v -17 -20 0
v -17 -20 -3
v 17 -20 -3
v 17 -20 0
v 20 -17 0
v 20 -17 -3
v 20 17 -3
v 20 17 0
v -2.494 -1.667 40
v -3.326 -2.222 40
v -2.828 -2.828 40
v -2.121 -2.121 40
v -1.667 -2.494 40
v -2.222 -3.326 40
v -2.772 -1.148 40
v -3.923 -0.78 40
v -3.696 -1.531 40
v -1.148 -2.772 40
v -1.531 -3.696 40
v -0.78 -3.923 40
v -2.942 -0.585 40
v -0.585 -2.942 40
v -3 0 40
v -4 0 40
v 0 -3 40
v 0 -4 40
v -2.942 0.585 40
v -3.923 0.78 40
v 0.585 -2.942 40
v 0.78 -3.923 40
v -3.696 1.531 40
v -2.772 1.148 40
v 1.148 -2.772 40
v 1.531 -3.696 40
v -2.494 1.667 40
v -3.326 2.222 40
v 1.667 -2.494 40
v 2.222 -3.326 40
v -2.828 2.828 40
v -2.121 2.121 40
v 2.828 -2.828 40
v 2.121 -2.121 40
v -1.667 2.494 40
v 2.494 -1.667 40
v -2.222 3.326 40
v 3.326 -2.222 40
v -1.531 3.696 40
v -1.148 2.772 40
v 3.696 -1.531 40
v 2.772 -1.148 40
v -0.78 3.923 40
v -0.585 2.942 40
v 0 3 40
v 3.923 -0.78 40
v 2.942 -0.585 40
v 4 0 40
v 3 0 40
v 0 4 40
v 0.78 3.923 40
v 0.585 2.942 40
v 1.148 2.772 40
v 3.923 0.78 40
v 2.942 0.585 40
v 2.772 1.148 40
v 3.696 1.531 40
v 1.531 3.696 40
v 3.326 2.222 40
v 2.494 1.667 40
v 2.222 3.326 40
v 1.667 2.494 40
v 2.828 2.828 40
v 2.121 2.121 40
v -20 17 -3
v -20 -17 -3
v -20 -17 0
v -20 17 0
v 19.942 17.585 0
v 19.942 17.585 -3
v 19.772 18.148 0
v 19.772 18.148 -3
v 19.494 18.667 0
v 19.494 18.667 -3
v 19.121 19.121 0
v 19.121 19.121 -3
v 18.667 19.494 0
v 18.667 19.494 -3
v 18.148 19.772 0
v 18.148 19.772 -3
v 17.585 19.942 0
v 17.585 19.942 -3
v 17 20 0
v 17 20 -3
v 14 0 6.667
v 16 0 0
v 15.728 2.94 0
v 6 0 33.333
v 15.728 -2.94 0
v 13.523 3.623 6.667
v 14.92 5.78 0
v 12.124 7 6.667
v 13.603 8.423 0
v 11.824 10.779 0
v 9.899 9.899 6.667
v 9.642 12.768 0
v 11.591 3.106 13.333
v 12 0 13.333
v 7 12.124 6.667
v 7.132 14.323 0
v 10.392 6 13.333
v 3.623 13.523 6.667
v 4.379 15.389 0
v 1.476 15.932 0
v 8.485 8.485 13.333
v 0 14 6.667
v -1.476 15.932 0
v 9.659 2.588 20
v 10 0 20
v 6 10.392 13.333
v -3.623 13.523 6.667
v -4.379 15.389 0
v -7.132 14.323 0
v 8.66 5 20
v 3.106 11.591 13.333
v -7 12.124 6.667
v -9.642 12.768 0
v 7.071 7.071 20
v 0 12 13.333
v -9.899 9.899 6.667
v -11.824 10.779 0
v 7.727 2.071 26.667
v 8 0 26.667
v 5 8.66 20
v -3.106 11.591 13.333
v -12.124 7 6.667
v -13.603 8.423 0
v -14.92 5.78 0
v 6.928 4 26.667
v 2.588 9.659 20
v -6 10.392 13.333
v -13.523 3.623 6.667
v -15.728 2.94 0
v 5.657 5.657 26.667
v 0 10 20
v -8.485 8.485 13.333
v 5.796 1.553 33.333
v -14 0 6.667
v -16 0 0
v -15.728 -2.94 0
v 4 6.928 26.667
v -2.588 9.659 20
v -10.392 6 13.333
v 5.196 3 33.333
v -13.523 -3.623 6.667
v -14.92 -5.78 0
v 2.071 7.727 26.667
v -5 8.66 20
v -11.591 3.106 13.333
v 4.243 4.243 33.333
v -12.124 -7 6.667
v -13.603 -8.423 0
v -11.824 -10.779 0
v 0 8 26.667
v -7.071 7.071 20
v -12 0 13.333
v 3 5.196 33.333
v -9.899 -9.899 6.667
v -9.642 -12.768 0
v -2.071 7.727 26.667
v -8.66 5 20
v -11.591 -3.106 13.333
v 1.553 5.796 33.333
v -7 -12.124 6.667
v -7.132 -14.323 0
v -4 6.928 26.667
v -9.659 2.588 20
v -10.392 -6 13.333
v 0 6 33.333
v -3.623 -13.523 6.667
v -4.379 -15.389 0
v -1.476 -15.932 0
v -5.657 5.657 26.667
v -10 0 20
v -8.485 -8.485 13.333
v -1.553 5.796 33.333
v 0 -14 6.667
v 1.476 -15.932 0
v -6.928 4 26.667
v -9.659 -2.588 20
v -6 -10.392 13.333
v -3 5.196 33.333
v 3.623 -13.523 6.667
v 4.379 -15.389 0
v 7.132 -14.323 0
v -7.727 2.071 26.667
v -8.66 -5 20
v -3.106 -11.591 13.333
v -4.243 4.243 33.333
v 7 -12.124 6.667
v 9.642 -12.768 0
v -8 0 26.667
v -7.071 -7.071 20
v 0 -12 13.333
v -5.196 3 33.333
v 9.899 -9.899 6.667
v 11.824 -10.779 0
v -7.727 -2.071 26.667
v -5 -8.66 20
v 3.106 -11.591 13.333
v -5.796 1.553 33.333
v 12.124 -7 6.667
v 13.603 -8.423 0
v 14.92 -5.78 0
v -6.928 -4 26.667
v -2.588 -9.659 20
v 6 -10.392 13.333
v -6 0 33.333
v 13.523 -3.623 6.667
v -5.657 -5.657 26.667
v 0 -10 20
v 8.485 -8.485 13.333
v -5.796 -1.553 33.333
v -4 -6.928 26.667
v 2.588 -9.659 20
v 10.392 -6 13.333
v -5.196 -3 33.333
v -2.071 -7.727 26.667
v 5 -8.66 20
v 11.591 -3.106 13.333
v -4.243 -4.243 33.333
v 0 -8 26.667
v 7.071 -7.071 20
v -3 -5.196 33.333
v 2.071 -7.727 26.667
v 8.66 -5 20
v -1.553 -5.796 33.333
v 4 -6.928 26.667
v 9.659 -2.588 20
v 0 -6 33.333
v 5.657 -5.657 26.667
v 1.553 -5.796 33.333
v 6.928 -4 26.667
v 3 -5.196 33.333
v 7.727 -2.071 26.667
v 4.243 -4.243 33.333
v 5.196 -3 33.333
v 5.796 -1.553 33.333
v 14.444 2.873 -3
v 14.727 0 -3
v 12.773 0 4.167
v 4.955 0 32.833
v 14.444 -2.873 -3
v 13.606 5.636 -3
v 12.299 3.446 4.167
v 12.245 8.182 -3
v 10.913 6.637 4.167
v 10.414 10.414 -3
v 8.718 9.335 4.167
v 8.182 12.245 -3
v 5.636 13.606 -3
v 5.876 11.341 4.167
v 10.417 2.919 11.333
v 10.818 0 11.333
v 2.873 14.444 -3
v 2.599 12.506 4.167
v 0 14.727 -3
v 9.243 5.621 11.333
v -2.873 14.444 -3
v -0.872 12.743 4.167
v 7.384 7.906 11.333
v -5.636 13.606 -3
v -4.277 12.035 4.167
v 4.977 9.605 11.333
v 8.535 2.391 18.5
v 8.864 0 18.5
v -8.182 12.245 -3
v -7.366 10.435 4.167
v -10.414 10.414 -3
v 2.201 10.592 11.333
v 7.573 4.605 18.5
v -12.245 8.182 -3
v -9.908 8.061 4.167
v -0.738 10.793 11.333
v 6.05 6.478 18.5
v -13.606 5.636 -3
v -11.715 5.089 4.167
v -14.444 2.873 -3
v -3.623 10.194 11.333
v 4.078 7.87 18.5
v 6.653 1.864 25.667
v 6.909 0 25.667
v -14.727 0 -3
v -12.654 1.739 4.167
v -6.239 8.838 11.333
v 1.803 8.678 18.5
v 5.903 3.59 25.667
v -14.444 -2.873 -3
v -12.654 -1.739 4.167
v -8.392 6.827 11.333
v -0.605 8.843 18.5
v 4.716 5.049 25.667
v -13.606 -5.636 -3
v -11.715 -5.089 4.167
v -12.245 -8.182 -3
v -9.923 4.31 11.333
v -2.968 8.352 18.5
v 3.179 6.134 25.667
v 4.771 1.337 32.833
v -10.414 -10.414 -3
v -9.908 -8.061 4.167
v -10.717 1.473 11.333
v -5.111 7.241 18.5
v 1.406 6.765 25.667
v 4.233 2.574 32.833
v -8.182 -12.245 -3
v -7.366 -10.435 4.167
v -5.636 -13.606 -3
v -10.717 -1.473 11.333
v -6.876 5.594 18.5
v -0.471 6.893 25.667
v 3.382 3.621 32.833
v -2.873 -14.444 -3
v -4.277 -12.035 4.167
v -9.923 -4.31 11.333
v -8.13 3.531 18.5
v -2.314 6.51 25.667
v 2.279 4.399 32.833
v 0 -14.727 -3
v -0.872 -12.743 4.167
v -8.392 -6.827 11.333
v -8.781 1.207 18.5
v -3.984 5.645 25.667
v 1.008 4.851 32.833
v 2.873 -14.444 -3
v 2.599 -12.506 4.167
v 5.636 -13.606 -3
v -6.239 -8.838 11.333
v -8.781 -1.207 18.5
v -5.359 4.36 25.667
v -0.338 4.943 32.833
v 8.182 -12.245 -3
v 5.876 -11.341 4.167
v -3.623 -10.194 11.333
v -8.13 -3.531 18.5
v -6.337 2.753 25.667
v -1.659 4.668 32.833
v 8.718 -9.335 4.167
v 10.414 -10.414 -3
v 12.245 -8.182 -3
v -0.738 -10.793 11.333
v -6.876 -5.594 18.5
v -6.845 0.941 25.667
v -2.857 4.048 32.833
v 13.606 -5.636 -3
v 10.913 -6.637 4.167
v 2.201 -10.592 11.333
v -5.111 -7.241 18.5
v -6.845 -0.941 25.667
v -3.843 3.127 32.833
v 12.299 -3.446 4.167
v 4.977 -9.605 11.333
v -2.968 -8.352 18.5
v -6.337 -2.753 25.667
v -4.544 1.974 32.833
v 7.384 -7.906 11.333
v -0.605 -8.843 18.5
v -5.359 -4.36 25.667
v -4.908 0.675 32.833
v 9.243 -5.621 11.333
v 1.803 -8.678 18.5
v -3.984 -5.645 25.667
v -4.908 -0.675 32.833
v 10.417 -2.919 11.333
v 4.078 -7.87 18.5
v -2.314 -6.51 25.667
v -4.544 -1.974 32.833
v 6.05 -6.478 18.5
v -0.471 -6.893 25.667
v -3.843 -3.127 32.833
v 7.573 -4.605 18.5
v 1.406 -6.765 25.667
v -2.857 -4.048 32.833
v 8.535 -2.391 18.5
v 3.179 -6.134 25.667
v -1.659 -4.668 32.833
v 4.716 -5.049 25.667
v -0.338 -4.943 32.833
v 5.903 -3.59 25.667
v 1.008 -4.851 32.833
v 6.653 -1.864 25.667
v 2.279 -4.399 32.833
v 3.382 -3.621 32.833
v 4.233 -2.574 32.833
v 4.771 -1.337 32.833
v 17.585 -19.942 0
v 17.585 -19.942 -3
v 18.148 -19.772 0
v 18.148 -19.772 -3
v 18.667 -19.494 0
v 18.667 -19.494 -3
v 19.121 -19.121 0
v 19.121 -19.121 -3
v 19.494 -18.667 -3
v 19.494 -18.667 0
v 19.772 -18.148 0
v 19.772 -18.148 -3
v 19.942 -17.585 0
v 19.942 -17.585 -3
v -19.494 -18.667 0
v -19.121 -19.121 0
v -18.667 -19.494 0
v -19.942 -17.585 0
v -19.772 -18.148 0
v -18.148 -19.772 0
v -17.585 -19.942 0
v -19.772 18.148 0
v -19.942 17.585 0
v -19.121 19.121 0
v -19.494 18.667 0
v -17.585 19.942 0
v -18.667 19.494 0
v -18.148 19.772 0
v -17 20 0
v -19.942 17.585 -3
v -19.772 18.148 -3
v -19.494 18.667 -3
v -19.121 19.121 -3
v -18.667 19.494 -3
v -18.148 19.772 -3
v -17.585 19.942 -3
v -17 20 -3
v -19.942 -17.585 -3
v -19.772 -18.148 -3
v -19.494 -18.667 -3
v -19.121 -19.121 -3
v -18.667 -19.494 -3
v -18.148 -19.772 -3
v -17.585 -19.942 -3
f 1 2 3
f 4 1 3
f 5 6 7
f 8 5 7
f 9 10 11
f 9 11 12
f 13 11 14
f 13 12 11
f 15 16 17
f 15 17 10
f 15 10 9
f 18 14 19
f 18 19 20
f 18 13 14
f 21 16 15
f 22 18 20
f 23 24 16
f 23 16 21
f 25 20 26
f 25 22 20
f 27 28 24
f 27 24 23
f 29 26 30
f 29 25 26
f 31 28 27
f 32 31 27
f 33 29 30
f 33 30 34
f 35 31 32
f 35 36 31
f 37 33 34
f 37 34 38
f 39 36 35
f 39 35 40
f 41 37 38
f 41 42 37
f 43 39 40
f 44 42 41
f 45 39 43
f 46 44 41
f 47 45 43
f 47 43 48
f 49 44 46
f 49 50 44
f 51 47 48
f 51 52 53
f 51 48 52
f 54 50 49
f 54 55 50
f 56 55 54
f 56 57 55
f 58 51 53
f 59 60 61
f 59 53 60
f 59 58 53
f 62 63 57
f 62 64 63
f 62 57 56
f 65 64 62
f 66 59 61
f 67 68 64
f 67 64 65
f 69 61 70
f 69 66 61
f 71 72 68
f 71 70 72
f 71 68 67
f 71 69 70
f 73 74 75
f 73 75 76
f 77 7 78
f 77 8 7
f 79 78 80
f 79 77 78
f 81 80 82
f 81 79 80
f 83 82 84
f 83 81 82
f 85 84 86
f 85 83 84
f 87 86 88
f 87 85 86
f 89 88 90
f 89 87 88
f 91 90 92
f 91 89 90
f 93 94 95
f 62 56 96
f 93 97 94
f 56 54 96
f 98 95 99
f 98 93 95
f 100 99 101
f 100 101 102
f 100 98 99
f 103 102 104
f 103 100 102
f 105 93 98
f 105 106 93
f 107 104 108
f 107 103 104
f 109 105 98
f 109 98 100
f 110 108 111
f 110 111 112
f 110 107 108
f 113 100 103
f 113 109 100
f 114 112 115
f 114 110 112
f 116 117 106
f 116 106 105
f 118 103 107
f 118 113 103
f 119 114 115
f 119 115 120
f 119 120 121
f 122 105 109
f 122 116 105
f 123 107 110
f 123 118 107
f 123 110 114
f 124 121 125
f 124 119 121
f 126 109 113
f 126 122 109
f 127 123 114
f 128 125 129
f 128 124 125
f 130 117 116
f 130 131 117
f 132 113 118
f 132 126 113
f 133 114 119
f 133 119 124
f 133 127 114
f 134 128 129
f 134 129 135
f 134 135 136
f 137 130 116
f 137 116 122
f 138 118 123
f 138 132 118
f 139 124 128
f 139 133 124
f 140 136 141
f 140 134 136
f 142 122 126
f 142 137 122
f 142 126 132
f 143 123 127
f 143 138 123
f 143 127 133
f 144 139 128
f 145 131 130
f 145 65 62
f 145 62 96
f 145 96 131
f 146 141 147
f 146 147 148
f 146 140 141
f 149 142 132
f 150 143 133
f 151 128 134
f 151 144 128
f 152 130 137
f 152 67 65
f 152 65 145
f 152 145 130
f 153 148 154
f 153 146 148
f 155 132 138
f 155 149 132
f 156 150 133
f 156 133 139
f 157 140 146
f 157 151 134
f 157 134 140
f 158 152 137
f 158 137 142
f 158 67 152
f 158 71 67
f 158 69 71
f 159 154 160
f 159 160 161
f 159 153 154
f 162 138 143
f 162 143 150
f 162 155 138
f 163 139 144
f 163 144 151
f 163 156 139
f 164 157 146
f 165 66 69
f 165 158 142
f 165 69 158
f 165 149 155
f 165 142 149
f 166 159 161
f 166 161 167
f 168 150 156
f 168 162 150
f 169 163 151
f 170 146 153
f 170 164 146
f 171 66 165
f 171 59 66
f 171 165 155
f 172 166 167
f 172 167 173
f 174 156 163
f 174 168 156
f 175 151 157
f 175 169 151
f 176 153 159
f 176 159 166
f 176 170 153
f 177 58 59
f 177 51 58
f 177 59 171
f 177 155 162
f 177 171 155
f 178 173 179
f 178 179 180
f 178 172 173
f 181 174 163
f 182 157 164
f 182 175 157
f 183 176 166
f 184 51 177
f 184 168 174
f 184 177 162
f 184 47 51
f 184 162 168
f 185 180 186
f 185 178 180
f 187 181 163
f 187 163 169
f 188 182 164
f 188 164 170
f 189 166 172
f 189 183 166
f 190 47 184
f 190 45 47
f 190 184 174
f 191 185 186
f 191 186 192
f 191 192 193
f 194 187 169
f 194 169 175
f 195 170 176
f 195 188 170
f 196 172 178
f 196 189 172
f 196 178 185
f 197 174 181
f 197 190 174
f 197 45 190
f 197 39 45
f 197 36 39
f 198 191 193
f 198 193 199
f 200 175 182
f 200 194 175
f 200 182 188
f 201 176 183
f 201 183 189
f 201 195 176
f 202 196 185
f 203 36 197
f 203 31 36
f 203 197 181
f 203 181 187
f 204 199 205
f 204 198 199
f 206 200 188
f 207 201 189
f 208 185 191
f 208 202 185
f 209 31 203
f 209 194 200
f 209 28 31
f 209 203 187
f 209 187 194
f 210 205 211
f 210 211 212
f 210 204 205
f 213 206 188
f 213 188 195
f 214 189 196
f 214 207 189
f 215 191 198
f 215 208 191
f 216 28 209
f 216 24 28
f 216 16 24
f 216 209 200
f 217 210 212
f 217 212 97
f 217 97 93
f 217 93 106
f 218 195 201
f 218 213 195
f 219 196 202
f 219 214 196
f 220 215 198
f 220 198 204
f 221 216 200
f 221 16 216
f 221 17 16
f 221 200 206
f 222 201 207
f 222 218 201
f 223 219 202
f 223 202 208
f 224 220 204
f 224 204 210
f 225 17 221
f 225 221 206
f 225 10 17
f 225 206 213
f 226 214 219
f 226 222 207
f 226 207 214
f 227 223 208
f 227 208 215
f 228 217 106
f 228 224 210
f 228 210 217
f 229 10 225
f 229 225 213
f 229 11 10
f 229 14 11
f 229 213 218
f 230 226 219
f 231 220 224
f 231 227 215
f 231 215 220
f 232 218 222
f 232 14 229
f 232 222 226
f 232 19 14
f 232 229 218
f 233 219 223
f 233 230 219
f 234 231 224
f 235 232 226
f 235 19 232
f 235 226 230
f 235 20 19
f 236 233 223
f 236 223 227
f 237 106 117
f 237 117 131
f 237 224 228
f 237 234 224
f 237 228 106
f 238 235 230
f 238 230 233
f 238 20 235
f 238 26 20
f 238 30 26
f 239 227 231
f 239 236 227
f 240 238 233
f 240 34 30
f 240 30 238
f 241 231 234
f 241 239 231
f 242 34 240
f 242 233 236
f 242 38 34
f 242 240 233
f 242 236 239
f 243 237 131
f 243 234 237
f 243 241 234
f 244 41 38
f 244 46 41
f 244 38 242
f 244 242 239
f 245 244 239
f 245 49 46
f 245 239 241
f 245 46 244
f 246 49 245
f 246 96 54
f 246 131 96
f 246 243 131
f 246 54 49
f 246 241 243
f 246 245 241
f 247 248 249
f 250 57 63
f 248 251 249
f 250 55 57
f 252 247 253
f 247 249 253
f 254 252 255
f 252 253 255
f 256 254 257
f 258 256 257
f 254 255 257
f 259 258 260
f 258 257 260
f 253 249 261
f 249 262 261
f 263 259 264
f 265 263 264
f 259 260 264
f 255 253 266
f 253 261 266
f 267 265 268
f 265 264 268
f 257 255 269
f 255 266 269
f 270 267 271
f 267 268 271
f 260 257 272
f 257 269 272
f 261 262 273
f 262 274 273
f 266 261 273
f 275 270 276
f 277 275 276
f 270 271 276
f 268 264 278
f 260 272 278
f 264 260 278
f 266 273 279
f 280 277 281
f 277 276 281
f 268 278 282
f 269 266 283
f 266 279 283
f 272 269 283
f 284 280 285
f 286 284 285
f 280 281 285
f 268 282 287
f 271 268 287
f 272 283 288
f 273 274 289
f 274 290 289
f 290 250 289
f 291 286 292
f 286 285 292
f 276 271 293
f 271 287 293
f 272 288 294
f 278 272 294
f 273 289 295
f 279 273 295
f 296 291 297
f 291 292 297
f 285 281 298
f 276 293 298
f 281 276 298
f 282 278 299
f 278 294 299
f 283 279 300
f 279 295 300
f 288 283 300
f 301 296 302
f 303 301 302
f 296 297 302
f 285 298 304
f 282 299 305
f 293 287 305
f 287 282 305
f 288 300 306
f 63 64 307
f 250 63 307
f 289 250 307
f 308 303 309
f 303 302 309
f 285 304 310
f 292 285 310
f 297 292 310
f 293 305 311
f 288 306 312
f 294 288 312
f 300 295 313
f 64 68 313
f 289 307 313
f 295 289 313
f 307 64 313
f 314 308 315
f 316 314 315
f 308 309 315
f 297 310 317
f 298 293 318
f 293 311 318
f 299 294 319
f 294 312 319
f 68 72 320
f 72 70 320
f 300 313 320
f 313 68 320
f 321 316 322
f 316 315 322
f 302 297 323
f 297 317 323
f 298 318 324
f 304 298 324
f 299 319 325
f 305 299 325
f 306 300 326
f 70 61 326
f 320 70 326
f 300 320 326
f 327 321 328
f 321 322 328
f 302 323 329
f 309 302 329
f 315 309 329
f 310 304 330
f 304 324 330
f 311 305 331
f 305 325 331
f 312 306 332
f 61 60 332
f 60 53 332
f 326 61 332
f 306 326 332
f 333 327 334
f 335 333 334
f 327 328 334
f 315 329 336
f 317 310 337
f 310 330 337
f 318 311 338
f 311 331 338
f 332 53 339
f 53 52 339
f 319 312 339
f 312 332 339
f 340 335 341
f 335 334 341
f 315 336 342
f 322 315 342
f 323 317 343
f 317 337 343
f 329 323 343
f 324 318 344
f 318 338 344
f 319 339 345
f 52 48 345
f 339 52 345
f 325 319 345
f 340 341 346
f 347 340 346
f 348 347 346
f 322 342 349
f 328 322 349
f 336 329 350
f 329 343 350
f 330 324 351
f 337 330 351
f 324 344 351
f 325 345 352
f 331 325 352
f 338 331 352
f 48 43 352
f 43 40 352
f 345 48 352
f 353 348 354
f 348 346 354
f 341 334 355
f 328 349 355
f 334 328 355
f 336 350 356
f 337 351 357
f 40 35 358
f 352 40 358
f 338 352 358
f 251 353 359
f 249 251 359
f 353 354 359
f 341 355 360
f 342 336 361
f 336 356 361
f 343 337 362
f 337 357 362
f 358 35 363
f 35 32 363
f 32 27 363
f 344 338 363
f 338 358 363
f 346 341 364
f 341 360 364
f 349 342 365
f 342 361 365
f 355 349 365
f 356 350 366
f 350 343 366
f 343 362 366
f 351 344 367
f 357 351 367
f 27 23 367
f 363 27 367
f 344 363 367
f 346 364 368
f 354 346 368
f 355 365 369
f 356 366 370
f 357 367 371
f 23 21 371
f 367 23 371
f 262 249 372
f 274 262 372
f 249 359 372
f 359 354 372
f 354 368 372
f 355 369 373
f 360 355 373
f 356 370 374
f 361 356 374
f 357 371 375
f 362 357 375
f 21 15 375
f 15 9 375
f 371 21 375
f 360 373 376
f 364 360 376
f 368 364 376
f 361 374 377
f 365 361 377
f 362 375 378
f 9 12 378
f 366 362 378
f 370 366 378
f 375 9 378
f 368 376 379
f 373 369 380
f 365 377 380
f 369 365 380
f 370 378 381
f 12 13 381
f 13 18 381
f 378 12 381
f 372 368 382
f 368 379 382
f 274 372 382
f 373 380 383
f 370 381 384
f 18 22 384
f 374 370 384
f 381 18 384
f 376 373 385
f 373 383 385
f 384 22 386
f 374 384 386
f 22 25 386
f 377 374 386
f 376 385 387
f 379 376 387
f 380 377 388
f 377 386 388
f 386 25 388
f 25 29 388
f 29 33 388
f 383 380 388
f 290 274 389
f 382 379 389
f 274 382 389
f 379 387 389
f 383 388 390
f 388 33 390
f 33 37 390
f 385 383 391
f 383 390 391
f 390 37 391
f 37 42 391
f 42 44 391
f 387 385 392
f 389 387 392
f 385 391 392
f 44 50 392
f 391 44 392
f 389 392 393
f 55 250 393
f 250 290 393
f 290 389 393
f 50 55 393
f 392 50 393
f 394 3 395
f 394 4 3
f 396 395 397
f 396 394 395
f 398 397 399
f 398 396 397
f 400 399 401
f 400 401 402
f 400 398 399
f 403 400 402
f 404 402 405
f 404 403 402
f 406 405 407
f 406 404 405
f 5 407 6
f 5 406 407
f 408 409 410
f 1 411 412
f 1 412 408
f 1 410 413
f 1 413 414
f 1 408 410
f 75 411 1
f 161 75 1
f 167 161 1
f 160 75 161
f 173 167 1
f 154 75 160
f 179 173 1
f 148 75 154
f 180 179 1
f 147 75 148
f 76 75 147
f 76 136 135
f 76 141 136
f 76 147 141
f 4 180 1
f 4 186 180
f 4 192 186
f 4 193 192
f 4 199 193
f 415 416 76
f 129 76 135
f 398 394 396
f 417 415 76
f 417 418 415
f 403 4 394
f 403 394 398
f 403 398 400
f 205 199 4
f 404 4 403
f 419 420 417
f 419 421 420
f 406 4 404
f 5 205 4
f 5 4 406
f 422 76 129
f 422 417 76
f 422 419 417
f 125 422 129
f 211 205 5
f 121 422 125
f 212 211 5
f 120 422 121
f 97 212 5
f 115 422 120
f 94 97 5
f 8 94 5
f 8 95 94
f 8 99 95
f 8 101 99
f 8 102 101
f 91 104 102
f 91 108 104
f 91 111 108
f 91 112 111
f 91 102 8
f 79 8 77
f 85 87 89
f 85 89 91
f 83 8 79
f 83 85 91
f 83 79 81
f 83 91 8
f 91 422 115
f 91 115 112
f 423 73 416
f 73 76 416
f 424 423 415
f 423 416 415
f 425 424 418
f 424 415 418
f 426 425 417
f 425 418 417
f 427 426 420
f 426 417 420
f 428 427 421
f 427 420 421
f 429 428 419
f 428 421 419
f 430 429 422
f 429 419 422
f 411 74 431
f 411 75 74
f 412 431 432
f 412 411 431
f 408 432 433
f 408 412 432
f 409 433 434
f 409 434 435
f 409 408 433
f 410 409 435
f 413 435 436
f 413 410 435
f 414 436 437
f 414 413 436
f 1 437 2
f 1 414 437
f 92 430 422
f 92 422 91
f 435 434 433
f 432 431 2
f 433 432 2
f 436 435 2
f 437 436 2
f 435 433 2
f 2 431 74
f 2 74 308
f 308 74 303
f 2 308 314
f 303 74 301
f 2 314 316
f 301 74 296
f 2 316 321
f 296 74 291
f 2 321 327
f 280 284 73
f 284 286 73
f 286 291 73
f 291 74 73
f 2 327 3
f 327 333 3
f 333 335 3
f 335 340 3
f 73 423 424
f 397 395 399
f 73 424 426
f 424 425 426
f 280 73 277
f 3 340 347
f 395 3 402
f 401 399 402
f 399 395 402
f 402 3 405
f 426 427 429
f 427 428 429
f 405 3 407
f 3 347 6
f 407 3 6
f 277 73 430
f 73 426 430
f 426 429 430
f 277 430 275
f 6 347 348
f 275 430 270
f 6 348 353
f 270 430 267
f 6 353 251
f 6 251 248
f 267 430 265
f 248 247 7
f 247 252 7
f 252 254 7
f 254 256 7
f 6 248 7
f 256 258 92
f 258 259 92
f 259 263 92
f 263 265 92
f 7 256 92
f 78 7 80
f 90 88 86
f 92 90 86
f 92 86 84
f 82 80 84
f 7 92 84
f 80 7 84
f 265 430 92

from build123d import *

# Parameters (mm, degrees)
BOX_W     = 40
BOX_H     = 40
BOX_DEPTH = 3
FILLET_R  = 3


with BuildPart() as con001:
    # Cone001 → Cone001 (revolve)
    with BuildSketch(Plane(origin=(0, 0, -4), x_dir=(1, 0, 0), z_dir=(0, -1, 0))):
        Polygon((0, 0), (15, 0), (3, 44), (0, 44), align=None)
    revolve(axis=Axis((0, 0, -4), (0, 0, 1)))


with BuildPart() as con:
    # Cone → Cone (revolve)
    with BuildSketch(Plane.XZ):
        Polygon((0, 0), (16, 0), (4, 40), (0, 40), align=None)
    revolve(axis=Axis((0, 0, 0), (0, 0, 1)))


with BuildPart() as cut:
    # Box → Box (new body)
    with BuildSketch(Plane.XY):
        with Locations((20, 20)):
            Rectangle(BOX_W, BOX_H)
    extrude(amount=BOX_DEPTH)

    # Fillet
    fillet_edges = [cut.edges().sort_by_distance(p)[0] for p in [
        (0, 0, 1.5),
        (0, 40, 1.5),
        (40, 0, 1.5),
        (40, 40, 1.5),
    ]]
    fillet(fillet_edges, radius=FILLET_R)


with BuildPart() as cut_1:
    # Fillet placement: moved
    add(cut.part.moved(Location((-20, -20, -3))))

    # Fusion: union Con
    add(con.part)

    # Cut: cut Con001
    add(con001.part, mode=Mode.SUBTRACT)


solid = cut_1.part
